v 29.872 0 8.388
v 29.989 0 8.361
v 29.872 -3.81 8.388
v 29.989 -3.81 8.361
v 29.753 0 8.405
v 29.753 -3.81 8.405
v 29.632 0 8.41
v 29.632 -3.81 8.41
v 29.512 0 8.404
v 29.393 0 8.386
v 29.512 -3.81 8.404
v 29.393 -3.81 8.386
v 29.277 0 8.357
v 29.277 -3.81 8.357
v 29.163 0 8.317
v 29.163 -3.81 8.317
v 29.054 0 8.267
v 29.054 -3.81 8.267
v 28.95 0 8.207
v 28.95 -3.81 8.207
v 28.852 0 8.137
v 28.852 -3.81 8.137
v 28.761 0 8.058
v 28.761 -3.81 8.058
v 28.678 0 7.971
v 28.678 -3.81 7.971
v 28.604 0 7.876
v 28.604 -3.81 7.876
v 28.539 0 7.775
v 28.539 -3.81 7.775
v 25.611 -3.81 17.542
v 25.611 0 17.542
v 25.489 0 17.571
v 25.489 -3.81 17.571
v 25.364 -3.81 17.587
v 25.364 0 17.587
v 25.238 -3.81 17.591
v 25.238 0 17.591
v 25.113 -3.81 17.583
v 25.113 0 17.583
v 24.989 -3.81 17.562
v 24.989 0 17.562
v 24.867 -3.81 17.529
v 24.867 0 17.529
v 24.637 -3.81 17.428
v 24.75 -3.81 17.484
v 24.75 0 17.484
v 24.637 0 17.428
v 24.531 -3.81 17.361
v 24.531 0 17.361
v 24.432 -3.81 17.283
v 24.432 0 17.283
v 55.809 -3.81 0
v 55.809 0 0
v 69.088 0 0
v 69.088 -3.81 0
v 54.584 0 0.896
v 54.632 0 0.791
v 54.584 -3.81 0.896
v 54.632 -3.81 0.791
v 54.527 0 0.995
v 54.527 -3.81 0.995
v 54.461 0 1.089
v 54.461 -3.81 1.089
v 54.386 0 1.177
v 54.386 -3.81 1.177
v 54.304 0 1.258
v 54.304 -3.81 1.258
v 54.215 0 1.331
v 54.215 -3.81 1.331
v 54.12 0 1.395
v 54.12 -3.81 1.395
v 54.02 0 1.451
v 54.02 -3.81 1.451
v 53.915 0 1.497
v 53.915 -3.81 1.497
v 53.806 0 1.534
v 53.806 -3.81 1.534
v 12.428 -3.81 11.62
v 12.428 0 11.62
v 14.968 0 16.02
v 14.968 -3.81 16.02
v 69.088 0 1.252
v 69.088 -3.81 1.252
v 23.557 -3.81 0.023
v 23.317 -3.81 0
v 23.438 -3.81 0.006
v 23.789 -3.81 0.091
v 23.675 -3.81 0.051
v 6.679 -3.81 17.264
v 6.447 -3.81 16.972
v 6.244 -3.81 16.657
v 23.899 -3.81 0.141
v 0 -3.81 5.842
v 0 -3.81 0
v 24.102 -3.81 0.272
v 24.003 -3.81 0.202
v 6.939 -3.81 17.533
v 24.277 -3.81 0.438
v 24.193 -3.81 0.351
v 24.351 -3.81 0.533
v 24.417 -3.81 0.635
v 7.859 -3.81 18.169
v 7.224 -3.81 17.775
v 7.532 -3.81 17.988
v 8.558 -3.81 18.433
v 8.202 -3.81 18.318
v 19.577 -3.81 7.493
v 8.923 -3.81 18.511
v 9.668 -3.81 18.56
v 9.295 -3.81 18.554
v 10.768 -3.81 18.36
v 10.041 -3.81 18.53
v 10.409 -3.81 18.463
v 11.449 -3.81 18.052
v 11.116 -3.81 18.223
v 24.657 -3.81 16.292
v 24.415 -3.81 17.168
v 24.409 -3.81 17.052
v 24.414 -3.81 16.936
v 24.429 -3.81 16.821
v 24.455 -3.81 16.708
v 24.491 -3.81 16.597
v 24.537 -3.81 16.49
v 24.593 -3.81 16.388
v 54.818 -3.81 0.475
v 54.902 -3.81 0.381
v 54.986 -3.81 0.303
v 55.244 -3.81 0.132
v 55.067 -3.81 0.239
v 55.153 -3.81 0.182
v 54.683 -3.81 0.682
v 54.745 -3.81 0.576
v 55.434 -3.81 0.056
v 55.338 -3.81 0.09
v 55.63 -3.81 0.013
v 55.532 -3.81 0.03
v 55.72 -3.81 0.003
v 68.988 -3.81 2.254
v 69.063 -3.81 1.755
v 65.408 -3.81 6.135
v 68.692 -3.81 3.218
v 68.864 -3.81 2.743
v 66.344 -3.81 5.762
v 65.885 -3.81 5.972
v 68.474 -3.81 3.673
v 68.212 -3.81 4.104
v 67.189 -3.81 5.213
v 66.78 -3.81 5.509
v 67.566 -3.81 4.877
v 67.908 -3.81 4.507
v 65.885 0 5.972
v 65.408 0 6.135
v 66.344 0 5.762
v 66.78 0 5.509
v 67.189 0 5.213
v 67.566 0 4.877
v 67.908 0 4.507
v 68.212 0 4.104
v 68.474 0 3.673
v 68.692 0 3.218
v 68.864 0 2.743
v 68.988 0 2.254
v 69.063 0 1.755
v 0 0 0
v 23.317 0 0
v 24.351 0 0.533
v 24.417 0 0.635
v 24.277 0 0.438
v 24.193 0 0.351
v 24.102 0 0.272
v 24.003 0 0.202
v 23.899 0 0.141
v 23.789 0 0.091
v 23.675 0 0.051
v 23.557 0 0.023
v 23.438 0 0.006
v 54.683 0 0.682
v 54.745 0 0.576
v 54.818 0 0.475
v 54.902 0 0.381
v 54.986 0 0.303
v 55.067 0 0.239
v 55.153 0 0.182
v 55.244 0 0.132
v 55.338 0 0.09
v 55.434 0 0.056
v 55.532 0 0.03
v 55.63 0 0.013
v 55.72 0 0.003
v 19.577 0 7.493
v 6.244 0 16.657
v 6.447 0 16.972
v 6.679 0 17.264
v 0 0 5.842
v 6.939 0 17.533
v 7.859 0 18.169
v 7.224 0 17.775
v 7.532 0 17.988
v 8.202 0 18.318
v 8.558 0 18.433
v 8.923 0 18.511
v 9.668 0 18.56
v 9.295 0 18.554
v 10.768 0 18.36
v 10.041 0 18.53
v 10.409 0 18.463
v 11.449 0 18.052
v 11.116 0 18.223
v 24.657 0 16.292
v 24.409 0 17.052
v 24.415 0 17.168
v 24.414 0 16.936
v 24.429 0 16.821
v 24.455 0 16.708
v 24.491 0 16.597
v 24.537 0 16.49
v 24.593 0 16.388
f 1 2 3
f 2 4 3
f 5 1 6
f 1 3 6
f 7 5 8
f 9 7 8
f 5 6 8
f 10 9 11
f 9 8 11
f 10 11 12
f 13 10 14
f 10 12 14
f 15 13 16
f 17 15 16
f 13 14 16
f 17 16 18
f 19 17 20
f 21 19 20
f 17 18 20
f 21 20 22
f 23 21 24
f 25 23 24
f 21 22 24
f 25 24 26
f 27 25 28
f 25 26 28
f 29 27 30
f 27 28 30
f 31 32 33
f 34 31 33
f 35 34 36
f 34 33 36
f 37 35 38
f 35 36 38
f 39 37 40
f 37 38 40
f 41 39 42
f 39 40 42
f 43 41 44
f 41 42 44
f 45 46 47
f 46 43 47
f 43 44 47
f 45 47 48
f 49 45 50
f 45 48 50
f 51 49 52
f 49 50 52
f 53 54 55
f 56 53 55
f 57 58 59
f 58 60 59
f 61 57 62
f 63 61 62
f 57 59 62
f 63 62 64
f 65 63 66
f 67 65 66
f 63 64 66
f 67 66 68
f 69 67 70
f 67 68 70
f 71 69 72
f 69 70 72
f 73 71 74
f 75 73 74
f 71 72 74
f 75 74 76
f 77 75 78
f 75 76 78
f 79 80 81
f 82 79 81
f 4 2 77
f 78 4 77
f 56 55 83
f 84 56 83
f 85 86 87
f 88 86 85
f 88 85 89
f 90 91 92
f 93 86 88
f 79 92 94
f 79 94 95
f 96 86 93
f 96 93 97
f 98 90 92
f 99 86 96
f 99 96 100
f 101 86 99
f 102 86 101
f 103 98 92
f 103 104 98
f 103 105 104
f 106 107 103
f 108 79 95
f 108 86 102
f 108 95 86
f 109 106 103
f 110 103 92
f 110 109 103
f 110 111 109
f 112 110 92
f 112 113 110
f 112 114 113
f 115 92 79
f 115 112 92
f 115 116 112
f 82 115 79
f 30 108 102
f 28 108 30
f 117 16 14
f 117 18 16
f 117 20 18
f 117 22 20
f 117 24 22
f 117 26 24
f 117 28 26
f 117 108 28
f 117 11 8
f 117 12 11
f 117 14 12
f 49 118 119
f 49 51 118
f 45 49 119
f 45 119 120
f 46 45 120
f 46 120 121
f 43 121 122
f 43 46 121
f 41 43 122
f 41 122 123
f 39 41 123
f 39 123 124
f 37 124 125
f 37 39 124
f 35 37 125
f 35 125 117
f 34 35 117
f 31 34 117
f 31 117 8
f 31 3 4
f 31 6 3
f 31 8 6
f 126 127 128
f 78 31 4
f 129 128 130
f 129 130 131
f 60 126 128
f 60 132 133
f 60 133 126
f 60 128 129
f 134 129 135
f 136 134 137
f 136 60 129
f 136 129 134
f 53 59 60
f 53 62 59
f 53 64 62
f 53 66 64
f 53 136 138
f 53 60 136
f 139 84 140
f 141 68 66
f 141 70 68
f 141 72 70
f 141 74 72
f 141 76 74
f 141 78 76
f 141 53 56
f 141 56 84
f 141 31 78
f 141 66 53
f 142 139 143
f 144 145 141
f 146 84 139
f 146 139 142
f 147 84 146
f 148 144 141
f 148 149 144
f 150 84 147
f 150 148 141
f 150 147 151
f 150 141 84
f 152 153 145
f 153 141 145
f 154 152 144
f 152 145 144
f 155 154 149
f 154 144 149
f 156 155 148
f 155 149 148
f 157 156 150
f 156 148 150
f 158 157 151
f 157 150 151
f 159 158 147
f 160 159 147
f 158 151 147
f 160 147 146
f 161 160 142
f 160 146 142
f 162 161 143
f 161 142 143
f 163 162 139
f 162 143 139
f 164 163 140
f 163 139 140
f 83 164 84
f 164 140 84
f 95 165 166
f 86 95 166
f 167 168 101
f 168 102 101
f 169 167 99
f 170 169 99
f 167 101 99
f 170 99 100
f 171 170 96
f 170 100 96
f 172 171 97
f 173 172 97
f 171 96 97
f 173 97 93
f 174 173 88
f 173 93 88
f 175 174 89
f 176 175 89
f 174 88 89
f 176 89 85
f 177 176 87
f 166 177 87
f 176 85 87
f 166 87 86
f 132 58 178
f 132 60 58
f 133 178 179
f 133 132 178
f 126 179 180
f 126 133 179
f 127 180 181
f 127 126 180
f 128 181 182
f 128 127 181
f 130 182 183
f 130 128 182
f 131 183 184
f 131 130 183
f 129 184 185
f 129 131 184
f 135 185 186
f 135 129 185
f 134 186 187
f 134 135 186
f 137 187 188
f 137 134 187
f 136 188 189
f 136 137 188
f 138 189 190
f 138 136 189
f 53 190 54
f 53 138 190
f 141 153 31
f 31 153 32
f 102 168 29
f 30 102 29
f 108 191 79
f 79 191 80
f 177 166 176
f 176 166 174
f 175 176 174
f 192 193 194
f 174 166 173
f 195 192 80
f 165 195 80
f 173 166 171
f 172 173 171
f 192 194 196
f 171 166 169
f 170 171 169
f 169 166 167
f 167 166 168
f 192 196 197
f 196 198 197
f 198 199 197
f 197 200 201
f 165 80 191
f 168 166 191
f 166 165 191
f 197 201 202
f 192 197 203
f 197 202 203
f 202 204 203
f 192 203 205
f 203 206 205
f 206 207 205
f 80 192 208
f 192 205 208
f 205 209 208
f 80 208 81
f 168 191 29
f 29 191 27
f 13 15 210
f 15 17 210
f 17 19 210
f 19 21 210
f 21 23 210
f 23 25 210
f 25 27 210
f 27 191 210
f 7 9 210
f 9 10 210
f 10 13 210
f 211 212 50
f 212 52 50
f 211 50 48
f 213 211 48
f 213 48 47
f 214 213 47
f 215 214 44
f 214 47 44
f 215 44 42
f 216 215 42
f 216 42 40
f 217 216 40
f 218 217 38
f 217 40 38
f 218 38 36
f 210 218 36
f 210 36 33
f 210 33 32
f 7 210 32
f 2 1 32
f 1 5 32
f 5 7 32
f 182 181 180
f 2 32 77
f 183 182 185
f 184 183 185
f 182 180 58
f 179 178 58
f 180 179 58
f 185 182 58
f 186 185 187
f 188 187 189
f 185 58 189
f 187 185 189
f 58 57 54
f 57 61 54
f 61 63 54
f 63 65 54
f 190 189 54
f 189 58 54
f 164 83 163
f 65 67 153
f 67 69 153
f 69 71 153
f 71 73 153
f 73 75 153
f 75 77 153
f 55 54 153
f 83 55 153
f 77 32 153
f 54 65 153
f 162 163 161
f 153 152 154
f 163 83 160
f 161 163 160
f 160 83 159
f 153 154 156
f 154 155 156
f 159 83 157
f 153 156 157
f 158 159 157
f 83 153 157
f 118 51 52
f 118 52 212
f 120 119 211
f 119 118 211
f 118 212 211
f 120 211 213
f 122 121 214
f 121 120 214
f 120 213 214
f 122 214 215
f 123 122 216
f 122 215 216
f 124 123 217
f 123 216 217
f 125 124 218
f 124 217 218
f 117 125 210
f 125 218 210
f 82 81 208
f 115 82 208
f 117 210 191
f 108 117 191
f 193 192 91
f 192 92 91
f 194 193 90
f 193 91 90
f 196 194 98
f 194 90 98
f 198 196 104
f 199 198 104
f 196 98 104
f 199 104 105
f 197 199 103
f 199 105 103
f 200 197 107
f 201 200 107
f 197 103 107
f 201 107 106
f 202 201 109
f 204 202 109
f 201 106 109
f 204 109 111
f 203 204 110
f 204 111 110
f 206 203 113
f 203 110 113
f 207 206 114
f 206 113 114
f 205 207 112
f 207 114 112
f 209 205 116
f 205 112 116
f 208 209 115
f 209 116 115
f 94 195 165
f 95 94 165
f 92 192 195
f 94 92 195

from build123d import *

# Parameters (mm, degrees)
F1_DEPTH    = 3.81
F2_T1_DEPTH = 8.770689479
F2_T3_DEPTH = 9.6298711326
F3_R        = 3.81
F4_R        = 5.08
F5_R        = 1.27
F6_R        = 1.27


# Not quite as in the source:
# - a fillet or chamfer that OpenCascade refuses, or shapes differently, is made with other operations: its cross-section is extruded or revolved along the edge and cut away or added


with BuildPart() as f1:
    # F0 (on Front) → F1 (new body)
    with BuildSketch(Plane.XZ):
        Polygon((0, 5.842), (0, 0), (24.0501028134, 0), (29.035013032, 8.6341177699), (54.7257371953, 1.27), (54.7257371953, 0), (69.088, 0), (69.088, 5.08), (24.657370278, 17.8158181024), (23.9974589203, 16.6728181024), (24.657370278, 16.2918181024), (19.577370278, 7.493), (12.4283305697, 11.6205), (14.9683305697, 16.0199090512), (8.1492465403, 19.9569090512), align=None)
    extrude(amount=F1_DEPTH)

    # F2: fillet of radius 1.27 on 2 edges, made by hand

    # F2_s2 → F2_t1 (cut)
    with BuildSketch(Plane.XZ.offset(-2.4803447395)):
        with BuildLine():
            ThreePointArc((25.6110997962, 17.5424362994), (24.7853486084, 17.4991029103), (24.16130133, 16.9566014806))
            Line((24.16130133, 16.9566014806), (24.657370278, 17.8158181024))
            Line((24.657370278, 17.8158181024), (25.6110997962, 17.5424362994))
        make_face()
    extrude(amount=F2_T1_DEPTH, mode=Mode.SUBTRACT)

    # F2_s4 → F2_t3 (cut)
    with BuildSketch(Plane.XZ.offset(-2.9099355663)):
        with BuildLine():
            ThreePointArc((24.5794460335, 17.680849352), (24.4112920489, 16.9747145746), (24.657370278, 16.2918181024))
            Line((24.657370278, 16.2918181024), (23.9974589203, 16.6728181024))
            Line((23.9974589203, 16.6728181024), (24.5794460335, 17.680849352))
        make_face()
    extrude(amount=F2_T3_DEPTH, mode=Mode.SUBTRACT)

    # F3
    f3_edges = [f1.edges().sort_by_distance(p)[0] for p in [
        (8.149247, -1.905, 19.956909),
    ]]
    fillet(f3_edges, radius=F3_R)

    # F4
    f4_edges = [f1.edges().sort_by_distance(p)[0] for p in [
        (69.088, -1.905, 5.08),
    ]]
    fillet(f4_edges, radius=F4_R)

    # F5
    f5_edges = [f1.edges().sort_by_distance(p)[0] for p in [
        (29.035013, -1.905, 8.634118),
        (24.050103, -1.905, 0),
        (54.725737, -1.905, 1.27),
    ]]
    fillet(f5_edges, radius=F5_R)

    # F6
    f6_edges = [f1.edges().sort_by_distance(p)[0] for p in [
        (54.725737, -1.905, 0),
    ]]
    fillet(f6_edges, radius=F6_R)


solid = f1.part
